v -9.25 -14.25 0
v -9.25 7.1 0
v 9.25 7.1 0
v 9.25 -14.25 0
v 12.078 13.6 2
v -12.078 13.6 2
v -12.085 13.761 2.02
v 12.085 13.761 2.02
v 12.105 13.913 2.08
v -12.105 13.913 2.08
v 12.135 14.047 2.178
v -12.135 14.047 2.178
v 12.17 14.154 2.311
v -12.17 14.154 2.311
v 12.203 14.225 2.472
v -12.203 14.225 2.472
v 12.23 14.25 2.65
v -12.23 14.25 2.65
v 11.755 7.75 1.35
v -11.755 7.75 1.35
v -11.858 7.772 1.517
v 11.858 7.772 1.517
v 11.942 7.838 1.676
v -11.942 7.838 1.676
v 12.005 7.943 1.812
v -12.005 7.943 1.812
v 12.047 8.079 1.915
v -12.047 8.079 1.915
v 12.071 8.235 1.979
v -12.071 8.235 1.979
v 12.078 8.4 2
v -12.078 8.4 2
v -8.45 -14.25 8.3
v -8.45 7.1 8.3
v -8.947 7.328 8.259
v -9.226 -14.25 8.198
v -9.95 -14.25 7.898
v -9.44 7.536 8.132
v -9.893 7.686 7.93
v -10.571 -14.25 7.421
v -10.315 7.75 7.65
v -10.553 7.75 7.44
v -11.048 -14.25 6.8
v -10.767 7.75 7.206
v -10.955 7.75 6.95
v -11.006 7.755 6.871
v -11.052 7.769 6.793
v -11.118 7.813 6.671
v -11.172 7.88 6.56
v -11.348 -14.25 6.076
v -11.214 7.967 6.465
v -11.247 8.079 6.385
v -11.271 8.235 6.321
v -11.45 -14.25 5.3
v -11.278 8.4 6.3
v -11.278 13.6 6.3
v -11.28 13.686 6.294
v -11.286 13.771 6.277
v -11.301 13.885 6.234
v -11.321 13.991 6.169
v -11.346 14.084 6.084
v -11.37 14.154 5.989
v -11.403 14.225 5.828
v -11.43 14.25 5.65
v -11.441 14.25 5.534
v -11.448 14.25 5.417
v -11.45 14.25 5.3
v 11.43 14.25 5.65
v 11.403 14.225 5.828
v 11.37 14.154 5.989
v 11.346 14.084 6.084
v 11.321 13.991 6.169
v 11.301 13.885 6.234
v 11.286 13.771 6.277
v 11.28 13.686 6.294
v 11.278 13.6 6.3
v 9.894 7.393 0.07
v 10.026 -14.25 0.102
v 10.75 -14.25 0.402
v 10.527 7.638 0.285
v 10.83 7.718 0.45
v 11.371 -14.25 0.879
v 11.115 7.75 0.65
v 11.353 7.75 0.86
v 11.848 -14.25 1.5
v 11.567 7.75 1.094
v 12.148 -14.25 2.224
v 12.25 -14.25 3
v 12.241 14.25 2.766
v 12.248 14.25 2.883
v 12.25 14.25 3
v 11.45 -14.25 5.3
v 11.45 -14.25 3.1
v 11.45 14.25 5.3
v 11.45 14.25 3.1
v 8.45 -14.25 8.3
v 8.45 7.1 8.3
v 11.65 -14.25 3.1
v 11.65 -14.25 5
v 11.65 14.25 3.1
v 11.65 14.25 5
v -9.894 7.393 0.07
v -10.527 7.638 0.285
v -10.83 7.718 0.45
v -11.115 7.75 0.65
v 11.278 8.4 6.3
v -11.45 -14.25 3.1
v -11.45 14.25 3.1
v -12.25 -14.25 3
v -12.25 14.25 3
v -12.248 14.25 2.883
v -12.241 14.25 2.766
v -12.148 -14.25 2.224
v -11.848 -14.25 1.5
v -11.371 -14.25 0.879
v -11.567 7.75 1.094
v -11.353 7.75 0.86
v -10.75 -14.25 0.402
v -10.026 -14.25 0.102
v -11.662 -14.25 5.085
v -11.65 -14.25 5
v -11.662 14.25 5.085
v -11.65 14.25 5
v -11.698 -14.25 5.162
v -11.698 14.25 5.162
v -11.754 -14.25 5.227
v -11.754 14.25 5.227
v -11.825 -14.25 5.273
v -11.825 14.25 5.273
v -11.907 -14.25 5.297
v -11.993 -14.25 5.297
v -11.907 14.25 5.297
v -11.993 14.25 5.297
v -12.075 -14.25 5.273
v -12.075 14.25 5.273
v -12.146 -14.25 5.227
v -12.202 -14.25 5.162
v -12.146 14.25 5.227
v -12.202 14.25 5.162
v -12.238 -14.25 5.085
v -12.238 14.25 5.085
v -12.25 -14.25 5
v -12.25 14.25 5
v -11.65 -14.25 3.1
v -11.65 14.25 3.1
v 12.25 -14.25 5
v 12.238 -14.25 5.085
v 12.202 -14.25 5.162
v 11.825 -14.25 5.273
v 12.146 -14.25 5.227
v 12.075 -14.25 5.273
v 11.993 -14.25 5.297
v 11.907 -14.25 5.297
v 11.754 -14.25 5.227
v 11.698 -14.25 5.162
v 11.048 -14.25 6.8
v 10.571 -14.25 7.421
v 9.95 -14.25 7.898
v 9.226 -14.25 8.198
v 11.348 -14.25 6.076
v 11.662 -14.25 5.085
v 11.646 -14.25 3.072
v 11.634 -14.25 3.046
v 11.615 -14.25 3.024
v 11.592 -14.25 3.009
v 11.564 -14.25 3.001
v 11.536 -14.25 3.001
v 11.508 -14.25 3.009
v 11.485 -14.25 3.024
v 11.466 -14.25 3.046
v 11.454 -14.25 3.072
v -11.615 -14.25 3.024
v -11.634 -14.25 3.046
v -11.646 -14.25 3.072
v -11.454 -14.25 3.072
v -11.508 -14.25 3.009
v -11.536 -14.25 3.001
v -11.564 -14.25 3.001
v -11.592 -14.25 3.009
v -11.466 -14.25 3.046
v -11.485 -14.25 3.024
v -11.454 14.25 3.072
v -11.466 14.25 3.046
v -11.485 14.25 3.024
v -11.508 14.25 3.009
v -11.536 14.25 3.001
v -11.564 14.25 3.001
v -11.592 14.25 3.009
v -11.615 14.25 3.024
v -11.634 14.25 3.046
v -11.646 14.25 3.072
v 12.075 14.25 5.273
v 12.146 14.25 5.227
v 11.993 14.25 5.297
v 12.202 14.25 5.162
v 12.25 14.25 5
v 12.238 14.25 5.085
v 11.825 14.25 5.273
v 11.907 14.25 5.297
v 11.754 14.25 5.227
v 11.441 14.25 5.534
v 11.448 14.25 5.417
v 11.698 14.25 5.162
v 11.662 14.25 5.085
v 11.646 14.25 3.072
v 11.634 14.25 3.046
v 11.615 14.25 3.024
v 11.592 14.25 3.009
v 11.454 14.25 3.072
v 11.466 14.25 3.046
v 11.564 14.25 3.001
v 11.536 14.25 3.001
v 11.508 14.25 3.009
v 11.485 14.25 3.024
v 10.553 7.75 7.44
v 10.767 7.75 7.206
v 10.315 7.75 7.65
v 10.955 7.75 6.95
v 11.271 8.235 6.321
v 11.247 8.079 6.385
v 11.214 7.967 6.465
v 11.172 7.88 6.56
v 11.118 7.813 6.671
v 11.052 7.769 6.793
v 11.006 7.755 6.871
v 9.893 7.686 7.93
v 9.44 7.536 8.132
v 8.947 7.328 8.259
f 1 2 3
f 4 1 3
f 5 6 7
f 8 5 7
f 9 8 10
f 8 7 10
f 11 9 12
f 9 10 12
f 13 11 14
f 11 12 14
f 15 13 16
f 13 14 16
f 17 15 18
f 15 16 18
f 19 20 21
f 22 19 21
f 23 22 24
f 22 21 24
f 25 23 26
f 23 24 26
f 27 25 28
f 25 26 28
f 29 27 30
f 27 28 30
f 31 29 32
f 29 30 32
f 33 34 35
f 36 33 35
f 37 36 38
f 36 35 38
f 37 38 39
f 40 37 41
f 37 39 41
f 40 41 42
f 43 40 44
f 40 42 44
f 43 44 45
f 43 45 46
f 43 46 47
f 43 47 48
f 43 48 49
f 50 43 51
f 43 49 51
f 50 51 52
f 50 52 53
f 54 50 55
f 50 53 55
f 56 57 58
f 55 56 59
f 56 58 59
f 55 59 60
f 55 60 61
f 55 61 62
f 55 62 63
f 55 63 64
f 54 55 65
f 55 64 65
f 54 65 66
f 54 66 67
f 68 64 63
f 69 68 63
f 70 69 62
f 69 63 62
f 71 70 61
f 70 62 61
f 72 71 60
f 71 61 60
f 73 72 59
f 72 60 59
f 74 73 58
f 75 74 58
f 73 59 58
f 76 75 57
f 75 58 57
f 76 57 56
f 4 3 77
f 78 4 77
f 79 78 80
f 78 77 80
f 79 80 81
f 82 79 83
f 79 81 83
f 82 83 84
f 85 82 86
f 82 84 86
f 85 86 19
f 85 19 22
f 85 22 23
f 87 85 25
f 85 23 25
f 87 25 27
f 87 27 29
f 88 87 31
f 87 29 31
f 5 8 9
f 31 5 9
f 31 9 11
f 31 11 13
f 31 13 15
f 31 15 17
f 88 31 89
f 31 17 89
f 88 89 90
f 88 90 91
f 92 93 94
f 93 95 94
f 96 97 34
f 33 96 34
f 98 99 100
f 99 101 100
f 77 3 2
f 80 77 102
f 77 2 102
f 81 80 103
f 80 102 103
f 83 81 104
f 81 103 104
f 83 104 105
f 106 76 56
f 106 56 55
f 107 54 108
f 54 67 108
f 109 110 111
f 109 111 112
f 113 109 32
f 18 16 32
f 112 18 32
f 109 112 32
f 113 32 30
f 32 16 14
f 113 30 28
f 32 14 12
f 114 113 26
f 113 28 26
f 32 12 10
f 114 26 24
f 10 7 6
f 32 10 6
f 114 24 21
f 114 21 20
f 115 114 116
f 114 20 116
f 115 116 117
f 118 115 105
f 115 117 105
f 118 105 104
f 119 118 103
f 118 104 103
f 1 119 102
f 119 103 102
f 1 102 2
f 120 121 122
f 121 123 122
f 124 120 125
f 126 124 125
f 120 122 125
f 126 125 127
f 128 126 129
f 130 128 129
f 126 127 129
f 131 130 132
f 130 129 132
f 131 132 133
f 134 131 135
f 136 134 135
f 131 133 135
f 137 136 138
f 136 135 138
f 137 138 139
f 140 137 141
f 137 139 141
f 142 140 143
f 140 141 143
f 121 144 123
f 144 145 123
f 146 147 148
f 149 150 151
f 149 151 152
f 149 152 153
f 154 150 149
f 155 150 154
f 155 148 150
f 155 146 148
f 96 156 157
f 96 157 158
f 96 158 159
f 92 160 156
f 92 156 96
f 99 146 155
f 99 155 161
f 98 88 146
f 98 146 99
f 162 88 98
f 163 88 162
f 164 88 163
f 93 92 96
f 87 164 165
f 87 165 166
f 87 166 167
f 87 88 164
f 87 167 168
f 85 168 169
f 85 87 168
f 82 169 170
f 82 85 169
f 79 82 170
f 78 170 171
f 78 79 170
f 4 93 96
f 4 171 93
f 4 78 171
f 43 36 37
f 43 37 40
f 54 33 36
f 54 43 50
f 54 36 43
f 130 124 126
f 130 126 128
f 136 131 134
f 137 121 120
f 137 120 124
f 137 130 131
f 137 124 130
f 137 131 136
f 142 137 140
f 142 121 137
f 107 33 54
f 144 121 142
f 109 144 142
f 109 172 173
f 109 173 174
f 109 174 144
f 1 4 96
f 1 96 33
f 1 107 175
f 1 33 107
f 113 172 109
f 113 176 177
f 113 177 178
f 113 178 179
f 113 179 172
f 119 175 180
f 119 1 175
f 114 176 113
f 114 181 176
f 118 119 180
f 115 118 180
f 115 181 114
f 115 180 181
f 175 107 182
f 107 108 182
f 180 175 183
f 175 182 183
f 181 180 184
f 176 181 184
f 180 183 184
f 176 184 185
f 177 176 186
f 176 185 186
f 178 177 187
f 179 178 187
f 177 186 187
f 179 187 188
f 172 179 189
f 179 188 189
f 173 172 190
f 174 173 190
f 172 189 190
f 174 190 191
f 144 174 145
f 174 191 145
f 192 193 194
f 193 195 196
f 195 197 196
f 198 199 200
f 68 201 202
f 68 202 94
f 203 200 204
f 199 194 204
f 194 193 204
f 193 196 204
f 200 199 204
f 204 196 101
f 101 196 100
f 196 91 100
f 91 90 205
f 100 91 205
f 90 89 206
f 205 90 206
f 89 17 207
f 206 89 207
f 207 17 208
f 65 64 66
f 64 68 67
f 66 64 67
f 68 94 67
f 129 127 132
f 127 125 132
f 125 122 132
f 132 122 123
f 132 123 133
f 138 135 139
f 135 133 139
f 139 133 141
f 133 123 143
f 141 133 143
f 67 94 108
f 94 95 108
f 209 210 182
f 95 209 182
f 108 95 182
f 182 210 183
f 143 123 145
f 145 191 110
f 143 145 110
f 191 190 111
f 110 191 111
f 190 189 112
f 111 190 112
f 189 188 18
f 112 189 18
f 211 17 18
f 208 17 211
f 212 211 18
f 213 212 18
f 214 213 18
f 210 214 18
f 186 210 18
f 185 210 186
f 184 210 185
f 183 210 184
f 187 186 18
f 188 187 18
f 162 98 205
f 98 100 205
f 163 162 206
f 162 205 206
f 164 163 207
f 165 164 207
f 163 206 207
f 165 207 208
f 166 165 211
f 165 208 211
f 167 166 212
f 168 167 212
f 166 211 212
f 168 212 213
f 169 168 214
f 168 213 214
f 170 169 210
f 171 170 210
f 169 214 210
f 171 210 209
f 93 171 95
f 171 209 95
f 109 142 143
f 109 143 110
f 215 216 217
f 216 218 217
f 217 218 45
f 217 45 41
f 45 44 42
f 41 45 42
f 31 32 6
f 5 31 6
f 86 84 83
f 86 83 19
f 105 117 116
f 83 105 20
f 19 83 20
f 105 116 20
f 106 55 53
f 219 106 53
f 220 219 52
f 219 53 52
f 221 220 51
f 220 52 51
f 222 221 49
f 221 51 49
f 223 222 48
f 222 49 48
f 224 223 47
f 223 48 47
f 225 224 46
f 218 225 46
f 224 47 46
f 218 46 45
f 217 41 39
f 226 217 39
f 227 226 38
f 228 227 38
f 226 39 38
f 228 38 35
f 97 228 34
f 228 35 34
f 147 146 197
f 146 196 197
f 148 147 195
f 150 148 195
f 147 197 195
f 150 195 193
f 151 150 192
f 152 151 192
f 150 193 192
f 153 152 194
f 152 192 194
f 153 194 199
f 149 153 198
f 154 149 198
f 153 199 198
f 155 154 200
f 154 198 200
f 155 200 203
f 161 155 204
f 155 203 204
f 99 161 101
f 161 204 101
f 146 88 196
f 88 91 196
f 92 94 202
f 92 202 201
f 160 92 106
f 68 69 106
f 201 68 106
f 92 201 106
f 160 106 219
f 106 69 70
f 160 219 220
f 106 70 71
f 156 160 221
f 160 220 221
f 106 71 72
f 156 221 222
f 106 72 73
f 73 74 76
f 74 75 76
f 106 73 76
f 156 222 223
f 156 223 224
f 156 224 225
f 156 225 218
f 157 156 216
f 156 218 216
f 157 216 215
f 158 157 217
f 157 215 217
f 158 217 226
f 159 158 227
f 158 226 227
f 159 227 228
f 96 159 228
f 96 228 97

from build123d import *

# Parameters (mm, degrees)
EXTRUDE_1_DEPTH     = 14.25
CUT_EXTRUDE_START   = -12.229513
CUT_EXTRUDE_1_DEPTH = 24.459026


with BuildPart() as part:
    # Эскиз1 → Бобышка-Вытянуть1 (new, symmetric)
    with BuildSketch(Plane(origin=(0, 0, 0), x_dir=(1, 0, 0), z_dir=(0, 1, 0))):
        with BuildLine():
            Line((-9.25, 0), (9.25, 0))
            ThreePointArc((9.25, 0), (11.371320344, -0.878679656), (12.25, -3))
            Line((12.25, -3), (12.25, -5))
            ThreePointArc((12.25, -5), (11.95, -5.3), (11.65, -5))
            Line((11.65, -5), (11.65, -3.1))
            ThreePointArc((11.65, -3.1), (11.55, -3), (11.45, -3.1))
            Line((11.45, -3.1), (11.45, -5.3))
            ThreePointArc((11.45, -5.3), (10.571320344, -7.421320344), (8.45, -8.3))
            Line((8.45, -8.3), (-8.45, -8.3))
            ThreePointArc((-8.45, -8.3), (-10.571320344, -7.421320344), (-11.45, -5.3))
            Line((-11.45, -5.3), (-11.45, -3.1))
            ThreePointArc((-11.45, -3.1), (-11.55, -3), (-11.65, -3.1))
            Line((-11.65, -3.1), (-11.65, -5))
            ThreePointArc((-11.65, -5), (-11.95, -5.3), (-12.25, -5))
            Line((-12.25, -5), (-12.25, -3))
            ThreePointArc((-12.25, -3), (-11.371320344, -0.878679656), (-9.25, 0))
        make_face()
    extrude(amount=EXTRUDE_1_DEPTH, both=True)

    # Эскиз2 → Вырез-Вытянуть1 (cut)
    with BuildSketch(Plane(origin=(0, 0, 0), x_dir=(0, 0, -1), z_dir=(1, 0, 0)).offset(CUT_EXTRUDE_START)):
        with BuildLine():
            Line((-6.3, 13.6), (-6.3, 8.4))
            ThreePointArc((-6.3, 8.4), (-6.490380592, 7.940380592), (-6.95, 7.75))
            Line((-6.95, 7.75), (-7.65, 7.75))
            ThreePointArc((-7.65, 7.75), (-8.109619408, 7.559619408), (-8.3, 7.1))
            Line((-8.3, 7.1), (-8.3, 14.25))
            Line((-8.3, 14.25), (-8.3, 15.25))
            Line((-8.3, 15.25), (0, 15.25))
            Line((0, 15.25), (0, 7.1))
            ThreePointArc((0, 7.1), (-0.190380592, 7.559619408), (-0.65, 7.75))
            Line((-0.65, 7.75), (-1.35, 7.75))
            ThreePointArc((-1.35, 7.75), (-1.809619408, 7.940380592), (-2, 8.4))
            Line((-2, 8.4), (-2, 13.6))
            ThreePointArc((-2, 13.6), (-2.190380592, 14.059619408), (-2.65, 14.25))
            Line((-2.65, 14.25), (-5.65, 14.25))
            ThreePointArc((-5.65, 14.25), (-6.109619408, 14.059619408), (-6.3, 13.6))
        make_face()
    extrude(amount=CUT_EXTRUDE_1_DEPTH, mode=Mode.SUBTRACT)


solid = part.part
